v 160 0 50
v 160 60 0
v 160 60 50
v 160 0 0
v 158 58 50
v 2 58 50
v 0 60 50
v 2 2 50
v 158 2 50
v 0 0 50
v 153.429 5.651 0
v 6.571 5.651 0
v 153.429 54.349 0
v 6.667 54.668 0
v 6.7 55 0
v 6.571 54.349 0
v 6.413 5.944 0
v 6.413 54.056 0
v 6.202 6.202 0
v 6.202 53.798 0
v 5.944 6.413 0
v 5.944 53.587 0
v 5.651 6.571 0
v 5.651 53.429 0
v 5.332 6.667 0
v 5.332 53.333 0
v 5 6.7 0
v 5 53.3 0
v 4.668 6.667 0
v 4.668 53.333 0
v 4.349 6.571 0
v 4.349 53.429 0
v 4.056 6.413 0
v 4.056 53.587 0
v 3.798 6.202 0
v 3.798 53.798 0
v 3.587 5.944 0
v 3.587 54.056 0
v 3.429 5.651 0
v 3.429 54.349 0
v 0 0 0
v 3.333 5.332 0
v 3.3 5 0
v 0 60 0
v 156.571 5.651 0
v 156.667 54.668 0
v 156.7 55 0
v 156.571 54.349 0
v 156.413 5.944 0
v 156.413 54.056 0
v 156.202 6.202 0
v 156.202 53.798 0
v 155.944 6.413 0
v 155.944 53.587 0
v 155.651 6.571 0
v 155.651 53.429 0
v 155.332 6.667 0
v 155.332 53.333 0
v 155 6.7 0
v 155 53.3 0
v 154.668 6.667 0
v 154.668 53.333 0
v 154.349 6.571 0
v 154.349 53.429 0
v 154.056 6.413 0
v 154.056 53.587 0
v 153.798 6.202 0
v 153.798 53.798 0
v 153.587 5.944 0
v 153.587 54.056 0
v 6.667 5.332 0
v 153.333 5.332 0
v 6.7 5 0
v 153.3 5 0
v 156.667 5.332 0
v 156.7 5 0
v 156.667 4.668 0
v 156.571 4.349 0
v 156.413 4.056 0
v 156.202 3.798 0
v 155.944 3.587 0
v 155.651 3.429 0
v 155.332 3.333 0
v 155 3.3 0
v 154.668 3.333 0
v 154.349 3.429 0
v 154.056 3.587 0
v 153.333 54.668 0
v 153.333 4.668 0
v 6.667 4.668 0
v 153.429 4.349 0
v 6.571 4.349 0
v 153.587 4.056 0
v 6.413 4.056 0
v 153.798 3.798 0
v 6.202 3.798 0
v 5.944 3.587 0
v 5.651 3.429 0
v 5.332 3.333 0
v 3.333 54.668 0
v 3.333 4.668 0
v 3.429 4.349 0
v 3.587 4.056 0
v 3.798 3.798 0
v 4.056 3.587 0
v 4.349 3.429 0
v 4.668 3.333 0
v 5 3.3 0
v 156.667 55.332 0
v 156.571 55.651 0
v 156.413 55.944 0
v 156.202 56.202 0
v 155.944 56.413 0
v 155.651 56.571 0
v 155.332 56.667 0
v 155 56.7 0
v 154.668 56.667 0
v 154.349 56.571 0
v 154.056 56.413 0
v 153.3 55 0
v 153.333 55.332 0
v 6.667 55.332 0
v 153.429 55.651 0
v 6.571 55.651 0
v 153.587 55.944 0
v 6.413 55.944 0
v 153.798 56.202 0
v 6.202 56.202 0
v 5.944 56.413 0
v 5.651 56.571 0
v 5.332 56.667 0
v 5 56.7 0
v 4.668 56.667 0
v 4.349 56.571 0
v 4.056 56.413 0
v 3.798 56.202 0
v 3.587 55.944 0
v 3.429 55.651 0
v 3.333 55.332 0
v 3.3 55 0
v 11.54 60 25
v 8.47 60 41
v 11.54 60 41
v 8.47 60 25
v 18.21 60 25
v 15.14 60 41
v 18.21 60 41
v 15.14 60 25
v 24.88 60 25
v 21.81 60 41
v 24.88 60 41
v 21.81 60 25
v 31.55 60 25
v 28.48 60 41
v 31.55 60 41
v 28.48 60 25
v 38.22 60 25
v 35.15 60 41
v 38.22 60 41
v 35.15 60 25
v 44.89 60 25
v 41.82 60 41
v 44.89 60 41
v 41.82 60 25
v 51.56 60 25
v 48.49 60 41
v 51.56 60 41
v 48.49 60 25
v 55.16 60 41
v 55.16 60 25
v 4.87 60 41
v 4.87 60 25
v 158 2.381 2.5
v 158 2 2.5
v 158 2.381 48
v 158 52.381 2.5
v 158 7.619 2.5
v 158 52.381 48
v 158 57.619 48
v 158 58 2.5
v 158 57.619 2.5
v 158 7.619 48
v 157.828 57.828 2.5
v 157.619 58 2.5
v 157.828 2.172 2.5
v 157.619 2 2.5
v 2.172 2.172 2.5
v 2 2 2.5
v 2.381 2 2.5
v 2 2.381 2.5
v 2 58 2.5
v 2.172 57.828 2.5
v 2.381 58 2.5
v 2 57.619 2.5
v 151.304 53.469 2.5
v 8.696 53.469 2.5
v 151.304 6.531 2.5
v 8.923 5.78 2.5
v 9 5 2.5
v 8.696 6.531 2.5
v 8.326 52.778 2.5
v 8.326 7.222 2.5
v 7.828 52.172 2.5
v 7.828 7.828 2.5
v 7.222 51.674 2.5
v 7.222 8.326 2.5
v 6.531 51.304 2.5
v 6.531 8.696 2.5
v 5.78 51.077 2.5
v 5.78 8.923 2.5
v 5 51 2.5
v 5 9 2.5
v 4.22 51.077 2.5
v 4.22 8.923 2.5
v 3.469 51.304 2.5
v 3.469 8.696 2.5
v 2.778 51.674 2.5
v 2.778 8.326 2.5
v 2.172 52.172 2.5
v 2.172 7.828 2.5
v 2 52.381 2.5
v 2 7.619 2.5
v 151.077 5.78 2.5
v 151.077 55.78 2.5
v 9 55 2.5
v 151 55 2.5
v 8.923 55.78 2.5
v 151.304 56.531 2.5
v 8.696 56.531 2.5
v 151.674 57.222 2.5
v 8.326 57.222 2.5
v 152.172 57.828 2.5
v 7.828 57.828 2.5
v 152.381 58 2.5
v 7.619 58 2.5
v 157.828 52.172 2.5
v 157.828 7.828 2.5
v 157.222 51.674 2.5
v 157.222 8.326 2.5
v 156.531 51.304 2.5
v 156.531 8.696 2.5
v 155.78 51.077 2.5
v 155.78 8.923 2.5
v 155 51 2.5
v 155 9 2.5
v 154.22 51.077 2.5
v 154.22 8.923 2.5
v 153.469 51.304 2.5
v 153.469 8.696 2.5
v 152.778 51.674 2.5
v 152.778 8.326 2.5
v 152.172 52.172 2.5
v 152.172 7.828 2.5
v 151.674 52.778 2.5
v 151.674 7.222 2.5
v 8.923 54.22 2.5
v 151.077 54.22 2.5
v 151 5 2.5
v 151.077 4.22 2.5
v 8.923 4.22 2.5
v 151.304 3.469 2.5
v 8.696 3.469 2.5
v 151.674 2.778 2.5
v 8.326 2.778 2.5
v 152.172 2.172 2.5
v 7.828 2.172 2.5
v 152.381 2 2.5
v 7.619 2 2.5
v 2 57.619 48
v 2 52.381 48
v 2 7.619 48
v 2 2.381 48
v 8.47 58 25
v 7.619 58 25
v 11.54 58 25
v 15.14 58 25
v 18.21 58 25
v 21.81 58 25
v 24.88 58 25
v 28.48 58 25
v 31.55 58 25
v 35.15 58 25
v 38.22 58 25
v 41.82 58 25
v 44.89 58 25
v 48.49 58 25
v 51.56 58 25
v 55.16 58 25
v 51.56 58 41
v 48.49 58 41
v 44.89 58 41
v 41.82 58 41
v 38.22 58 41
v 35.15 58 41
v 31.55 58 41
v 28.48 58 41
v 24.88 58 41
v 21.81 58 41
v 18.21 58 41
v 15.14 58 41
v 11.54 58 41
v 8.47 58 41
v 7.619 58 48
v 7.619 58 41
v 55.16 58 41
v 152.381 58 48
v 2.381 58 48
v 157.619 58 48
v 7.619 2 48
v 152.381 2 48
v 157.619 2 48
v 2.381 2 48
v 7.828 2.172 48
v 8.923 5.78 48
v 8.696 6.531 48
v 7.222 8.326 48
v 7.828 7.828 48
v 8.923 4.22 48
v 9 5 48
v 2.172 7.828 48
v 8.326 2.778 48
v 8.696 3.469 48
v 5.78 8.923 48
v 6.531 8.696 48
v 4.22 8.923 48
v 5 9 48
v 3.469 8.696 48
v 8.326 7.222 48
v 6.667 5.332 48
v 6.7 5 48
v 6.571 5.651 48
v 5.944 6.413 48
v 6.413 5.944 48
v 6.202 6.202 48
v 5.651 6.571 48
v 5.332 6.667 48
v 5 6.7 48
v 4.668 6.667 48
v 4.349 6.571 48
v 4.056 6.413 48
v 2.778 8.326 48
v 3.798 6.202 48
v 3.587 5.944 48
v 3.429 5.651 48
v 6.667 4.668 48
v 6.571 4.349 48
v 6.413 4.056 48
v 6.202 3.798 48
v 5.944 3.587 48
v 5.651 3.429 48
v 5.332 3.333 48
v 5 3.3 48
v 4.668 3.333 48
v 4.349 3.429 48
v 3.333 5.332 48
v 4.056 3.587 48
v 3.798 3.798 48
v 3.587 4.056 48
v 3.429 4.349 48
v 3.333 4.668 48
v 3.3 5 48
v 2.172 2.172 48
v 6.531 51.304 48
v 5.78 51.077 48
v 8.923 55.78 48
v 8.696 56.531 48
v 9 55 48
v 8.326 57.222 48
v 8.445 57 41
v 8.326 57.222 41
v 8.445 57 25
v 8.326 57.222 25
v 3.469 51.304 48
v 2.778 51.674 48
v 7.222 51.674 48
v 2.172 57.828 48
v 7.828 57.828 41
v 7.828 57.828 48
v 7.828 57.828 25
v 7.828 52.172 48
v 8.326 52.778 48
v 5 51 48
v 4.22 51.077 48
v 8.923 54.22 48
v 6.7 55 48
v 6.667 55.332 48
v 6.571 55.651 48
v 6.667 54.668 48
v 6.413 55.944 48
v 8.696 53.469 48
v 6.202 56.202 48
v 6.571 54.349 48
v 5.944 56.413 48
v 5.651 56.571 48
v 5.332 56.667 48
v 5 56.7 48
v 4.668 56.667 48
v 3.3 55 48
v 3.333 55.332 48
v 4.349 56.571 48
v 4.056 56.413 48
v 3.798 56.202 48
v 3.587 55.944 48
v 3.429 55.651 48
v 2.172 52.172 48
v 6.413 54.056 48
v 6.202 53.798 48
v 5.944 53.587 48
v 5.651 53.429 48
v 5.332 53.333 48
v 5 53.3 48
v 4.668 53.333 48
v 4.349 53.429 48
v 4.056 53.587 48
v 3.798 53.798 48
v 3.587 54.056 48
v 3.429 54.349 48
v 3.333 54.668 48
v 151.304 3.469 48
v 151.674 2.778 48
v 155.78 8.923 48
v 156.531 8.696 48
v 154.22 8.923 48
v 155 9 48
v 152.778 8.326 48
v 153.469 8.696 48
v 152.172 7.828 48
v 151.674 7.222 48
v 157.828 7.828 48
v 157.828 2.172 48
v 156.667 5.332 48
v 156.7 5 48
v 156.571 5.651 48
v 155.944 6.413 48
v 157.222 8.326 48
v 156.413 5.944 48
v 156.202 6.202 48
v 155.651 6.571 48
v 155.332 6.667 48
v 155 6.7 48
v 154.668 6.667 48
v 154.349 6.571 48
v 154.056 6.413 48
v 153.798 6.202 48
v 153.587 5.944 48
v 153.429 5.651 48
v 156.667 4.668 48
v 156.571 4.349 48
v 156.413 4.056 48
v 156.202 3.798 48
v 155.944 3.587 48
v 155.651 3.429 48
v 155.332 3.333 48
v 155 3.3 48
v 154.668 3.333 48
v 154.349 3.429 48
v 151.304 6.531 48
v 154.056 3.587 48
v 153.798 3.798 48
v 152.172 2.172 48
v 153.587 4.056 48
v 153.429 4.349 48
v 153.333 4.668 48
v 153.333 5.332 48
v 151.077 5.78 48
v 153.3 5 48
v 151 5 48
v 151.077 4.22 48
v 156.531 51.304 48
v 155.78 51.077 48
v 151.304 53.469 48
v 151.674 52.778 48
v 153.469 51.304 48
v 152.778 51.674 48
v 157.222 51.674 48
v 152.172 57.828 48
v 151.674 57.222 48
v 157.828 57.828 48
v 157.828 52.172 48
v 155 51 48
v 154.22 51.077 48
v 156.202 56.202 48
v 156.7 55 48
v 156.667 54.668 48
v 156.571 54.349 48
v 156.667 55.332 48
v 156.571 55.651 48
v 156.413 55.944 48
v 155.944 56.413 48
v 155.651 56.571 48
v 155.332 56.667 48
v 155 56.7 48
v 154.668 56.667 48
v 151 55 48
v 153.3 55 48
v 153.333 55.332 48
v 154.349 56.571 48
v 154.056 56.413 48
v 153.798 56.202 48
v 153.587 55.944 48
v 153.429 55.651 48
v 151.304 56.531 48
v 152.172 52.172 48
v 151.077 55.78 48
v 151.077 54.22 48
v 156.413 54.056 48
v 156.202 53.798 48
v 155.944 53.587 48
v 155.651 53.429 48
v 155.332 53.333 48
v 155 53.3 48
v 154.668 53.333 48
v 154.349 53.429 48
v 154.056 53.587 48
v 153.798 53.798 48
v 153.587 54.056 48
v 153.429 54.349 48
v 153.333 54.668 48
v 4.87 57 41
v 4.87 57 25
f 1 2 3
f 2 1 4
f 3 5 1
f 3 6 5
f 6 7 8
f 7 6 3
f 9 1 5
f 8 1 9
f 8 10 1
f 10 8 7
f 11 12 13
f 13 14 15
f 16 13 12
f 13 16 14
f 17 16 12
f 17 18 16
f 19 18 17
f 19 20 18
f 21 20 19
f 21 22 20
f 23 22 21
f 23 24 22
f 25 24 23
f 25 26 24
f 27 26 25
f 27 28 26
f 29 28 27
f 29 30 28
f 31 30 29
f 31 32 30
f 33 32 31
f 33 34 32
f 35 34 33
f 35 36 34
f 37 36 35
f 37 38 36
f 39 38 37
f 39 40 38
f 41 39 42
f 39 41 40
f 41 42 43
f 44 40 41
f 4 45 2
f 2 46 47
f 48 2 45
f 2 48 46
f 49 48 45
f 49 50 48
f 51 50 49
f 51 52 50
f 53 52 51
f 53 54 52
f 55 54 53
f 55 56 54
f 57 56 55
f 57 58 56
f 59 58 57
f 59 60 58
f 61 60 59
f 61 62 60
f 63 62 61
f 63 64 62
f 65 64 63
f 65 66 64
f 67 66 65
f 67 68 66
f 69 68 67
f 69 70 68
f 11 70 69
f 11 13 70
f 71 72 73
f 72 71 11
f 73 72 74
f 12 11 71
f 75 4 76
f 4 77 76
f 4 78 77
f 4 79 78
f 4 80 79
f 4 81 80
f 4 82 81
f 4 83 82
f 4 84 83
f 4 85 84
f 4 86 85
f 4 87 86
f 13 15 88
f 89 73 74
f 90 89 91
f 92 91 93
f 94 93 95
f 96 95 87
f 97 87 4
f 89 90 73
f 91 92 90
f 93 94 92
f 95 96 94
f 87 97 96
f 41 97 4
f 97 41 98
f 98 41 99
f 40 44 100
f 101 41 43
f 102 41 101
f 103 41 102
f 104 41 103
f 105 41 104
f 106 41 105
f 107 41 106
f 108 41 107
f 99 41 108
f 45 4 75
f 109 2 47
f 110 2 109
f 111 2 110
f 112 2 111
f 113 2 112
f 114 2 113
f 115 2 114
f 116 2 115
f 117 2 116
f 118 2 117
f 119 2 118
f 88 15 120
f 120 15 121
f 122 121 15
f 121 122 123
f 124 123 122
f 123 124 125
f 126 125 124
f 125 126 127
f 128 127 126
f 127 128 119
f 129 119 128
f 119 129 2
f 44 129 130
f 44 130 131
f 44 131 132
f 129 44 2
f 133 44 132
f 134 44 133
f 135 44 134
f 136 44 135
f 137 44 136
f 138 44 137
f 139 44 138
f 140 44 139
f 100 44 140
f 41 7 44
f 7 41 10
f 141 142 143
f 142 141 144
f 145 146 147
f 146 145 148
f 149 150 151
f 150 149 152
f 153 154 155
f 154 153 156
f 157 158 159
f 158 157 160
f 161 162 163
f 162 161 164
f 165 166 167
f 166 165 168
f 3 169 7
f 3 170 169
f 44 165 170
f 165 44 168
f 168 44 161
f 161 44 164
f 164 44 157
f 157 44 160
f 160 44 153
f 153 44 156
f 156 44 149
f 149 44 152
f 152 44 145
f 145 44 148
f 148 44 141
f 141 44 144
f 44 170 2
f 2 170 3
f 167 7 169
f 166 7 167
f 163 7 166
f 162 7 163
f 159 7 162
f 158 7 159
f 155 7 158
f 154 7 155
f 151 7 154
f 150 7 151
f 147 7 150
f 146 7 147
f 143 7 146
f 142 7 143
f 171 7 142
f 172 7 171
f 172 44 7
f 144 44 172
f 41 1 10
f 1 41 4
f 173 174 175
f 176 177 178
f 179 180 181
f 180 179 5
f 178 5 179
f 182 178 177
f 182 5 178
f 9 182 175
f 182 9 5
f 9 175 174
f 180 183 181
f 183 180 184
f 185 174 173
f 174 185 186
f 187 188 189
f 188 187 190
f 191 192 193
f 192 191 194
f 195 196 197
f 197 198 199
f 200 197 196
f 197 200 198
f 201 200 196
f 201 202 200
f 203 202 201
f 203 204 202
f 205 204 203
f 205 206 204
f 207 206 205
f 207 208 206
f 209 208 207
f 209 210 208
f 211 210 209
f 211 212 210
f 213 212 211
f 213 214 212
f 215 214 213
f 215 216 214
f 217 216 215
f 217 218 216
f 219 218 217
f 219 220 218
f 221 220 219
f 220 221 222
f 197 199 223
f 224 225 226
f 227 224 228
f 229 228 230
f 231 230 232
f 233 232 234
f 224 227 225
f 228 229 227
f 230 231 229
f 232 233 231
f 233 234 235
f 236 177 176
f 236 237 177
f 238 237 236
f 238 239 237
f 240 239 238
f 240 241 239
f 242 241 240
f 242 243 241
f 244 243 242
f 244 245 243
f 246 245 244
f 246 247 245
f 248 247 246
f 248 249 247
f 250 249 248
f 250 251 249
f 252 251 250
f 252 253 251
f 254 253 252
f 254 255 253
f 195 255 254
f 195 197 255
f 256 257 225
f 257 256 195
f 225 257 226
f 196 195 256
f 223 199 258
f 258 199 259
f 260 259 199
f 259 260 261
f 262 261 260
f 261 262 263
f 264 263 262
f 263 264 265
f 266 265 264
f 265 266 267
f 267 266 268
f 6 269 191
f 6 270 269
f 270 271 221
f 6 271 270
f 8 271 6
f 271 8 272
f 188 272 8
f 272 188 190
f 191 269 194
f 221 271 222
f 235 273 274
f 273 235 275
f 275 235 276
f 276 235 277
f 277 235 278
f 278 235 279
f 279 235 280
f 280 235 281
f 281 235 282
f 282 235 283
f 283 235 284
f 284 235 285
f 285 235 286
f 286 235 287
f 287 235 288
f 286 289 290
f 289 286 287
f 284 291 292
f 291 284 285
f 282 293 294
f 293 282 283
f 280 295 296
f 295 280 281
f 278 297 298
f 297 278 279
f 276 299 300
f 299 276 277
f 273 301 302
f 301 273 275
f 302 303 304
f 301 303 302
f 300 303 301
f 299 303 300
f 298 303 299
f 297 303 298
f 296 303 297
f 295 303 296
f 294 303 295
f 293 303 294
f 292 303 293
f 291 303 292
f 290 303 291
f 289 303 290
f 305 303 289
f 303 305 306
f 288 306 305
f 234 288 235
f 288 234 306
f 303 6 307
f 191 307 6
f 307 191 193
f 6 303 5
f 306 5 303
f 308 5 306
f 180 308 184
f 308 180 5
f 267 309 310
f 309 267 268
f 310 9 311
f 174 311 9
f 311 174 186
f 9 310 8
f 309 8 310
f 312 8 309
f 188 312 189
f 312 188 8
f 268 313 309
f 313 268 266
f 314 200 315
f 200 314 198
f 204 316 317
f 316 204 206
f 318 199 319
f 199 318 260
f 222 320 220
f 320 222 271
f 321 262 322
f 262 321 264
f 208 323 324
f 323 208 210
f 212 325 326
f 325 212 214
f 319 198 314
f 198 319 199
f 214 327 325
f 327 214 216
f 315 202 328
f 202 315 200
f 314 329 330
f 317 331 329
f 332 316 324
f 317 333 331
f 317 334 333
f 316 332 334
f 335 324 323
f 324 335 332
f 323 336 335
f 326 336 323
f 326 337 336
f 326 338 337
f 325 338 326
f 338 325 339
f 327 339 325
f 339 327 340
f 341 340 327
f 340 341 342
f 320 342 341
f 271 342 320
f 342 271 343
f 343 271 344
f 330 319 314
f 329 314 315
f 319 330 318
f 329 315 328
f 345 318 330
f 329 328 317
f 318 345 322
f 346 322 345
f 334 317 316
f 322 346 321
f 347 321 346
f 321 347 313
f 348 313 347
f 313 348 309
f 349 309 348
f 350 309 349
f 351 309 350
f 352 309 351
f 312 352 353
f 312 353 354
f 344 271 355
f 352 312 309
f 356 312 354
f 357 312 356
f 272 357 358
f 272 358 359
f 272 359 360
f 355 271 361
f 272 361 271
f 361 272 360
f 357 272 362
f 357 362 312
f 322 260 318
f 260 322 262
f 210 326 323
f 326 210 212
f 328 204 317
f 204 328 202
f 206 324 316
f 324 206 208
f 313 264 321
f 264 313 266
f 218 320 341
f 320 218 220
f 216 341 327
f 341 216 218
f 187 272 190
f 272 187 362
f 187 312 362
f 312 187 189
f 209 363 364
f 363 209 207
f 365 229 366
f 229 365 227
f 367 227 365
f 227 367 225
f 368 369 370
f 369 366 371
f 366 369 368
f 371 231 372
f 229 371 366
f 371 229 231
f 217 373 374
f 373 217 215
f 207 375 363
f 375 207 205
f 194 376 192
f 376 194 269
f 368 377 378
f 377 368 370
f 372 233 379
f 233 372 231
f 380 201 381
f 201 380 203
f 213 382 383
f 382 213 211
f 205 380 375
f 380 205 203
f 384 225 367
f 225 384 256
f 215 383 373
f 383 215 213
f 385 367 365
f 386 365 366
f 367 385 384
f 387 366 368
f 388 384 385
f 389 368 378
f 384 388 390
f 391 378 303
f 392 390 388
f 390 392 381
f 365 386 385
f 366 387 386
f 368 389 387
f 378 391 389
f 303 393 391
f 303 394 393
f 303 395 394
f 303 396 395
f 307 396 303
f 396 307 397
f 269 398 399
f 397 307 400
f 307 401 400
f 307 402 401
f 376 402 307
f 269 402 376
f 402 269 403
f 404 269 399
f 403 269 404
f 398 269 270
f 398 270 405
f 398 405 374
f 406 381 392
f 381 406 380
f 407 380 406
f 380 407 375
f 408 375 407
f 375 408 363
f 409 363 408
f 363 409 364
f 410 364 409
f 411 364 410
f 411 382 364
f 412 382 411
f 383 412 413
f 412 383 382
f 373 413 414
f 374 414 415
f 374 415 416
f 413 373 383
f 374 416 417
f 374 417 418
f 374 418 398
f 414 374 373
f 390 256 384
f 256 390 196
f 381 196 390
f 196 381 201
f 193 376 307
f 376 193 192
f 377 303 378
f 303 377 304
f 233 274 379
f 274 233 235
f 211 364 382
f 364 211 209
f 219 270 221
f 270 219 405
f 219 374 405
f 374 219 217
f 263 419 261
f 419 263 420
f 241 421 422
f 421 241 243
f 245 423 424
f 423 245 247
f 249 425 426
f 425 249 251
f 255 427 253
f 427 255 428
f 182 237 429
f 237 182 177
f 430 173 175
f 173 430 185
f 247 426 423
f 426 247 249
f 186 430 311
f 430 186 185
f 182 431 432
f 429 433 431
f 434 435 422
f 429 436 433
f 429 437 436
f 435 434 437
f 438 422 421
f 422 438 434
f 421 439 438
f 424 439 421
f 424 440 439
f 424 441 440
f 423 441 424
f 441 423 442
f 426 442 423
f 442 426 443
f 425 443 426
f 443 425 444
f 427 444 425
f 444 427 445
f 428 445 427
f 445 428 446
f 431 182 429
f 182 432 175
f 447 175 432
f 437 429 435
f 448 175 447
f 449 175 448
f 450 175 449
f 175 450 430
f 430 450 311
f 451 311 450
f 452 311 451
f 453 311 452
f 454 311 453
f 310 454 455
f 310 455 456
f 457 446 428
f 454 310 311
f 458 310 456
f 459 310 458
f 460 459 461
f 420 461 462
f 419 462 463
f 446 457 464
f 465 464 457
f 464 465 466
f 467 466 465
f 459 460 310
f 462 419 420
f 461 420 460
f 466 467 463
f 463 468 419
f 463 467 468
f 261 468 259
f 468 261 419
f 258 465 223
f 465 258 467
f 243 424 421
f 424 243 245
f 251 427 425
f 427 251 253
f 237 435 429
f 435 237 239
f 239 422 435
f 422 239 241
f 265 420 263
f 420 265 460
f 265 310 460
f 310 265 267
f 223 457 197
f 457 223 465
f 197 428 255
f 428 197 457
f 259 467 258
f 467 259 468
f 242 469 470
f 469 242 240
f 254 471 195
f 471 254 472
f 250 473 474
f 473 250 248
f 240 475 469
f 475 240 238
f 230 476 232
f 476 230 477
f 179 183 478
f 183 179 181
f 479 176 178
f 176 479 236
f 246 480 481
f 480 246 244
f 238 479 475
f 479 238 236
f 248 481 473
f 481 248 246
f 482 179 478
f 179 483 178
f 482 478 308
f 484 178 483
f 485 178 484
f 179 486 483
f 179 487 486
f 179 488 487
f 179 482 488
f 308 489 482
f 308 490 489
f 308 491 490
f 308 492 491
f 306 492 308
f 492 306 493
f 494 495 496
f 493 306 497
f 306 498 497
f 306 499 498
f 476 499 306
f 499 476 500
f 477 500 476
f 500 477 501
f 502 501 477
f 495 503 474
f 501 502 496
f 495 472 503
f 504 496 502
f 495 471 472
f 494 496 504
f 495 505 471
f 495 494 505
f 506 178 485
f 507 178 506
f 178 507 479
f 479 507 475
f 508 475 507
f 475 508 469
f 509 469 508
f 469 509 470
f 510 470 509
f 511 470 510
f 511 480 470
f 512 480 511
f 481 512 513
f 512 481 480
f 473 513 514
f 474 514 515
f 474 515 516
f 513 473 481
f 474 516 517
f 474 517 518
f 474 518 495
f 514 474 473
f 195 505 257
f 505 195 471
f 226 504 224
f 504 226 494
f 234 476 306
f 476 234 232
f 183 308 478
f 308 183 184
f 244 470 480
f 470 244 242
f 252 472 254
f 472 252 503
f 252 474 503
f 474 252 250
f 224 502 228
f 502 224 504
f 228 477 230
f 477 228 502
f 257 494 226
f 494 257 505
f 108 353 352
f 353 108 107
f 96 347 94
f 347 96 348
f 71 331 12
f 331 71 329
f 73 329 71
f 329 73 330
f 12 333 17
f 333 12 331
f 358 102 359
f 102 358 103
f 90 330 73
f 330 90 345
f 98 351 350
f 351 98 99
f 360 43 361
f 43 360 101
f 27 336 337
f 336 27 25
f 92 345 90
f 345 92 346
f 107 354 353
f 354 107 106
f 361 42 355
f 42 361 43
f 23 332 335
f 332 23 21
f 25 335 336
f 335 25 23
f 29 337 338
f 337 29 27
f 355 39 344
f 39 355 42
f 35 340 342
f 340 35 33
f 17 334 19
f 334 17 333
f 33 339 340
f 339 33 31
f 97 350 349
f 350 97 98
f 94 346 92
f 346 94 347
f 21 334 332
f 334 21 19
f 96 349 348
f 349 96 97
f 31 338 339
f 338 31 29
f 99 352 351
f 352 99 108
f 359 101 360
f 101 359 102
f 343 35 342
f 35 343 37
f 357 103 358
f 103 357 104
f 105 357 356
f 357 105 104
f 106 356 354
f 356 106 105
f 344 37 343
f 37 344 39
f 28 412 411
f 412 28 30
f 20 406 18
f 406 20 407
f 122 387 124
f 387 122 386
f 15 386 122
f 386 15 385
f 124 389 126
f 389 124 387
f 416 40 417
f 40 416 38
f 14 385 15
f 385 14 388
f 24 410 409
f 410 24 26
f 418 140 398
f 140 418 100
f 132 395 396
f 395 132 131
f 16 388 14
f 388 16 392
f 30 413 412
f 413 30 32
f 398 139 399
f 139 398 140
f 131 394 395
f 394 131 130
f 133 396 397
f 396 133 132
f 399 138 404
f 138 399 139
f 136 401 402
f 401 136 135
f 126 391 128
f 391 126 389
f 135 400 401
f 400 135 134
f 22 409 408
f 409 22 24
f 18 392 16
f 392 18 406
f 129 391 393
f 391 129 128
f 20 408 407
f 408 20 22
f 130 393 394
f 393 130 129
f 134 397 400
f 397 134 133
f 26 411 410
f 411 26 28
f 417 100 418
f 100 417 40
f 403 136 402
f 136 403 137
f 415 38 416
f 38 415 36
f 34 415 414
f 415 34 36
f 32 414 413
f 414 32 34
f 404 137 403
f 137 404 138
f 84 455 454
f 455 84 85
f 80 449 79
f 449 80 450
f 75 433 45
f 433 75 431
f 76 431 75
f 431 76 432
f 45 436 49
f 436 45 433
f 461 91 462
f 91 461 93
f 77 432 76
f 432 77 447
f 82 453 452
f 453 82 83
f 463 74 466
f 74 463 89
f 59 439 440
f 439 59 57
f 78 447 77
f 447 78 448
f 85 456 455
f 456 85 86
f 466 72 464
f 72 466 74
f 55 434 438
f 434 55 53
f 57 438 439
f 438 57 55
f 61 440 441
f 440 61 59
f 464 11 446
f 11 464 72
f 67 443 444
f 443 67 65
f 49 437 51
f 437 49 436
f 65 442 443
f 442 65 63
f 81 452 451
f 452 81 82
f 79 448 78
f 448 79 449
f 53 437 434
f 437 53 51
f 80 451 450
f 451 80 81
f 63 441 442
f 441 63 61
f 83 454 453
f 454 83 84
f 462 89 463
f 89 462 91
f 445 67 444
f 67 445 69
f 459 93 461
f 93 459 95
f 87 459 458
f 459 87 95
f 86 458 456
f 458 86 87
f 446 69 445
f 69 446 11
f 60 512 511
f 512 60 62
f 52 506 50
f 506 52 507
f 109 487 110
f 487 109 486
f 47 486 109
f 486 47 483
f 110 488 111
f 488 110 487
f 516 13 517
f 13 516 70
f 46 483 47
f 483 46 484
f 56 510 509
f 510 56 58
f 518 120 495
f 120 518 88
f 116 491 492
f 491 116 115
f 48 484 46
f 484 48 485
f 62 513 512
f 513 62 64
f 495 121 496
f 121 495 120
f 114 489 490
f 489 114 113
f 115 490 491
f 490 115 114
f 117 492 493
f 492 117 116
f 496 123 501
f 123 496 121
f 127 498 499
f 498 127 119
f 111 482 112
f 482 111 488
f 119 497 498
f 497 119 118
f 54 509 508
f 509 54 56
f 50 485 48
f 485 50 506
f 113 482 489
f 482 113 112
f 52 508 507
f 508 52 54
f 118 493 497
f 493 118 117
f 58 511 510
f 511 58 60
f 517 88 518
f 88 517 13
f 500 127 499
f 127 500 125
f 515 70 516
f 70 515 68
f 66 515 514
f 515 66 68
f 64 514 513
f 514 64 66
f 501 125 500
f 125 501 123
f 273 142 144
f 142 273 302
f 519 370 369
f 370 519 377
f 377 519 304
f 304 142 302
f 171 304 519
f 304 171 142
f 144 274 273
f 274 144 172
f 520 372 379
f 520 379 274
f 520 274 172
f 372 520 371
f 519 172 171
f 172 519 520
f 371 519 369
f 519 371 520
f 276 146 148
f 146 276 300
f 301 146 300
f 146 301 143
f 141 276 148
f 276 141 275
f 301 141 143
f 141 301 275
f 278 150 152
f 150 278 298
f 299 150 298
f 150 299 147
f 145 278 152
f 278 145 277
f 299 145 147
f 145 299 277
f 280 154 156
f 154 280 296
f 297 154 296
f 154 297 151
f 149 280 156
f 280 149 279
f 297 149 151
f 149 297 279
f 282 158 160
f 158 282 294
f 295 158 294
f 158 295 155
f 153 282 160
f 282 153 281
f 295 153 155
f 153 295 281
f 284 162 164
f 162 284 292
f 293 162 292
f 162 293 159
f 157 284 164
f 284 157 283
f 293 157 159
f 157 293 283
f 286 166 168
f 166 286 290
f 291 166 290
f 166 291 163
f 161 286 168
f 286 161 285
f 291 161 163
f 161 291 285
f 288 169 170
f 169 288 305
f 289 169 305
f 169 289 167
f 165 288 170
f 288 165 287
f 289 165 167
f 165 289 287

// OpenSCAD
$fn = 32;

// ----------------------------------------------------------------------
// Enclosure body: 160 x 60 x 50 mm, wall 2 mm
// ----------------------------------------------------------------------

// --- parameters (mm) ---
length = 160;             // outside length, X
width = 60;               // outside width, Y
height = 50;              // outside height, Z
wall = 2;                 // side wall thickness
floor_t = 2.5;            // floor thickness
boss_d = 8;               // corner boss diameter
boss_h = 45.5;            // corner boss height above the floor
boss_hole_d = 3.4;        // lid screw clearance in the boss
boss_lip = 5;             // boss centre inset from the corner
vent_slots = 8;           // vent slots in the long wall
vent_w = 3.6;             // vent slot width
vent_h = 16;              // vent slot height
vent_pitch = 6.67;        // vent slot pitch
vent_z = 25;              // vent slot sill height

module shell() {
  difference() {
    cube([length, width, height]);
    /* hollow, open at the top */
    translate([wall, wall, floor_t])
      cube([length - 2 * wall, width - 2 * wall, height]);
  }
}

module bosses() {
  /* corner bosses, sunk 1 mm into the floor */
  for (sx = [0, 1]) for (sy = [0, 1])
    translate([sx * (length - 2 * boss_lip) + boss_lip, sy * (width - 2 * boss_lip) + boss_lip, floor_t - 1])
      cylinder(h = boss_h + 1, d = boss_d);
}

difference() {
  union() {
    shell();
    bosses();
  }
  /* boss screw holes */
  for (sx = [0, 1]) for (sy = [0, 1])
    translate([sx * (length - 2 * boss_lip) + boss_lip, sy * (width - 2 * boss_lip) + boss_lip, -1]) cylinder(h = floor_t + boss_h + 2, d = boss_hole_d);
  /* vent grille in the +Y wall */
  for (i = [0 : vent_slots - 1]) translate([vent_pitch * (i + 1) - vent_w / 2, width - wall - 1, vent_z]) cube([vent_w, wall + 2, vent_h]);
}
